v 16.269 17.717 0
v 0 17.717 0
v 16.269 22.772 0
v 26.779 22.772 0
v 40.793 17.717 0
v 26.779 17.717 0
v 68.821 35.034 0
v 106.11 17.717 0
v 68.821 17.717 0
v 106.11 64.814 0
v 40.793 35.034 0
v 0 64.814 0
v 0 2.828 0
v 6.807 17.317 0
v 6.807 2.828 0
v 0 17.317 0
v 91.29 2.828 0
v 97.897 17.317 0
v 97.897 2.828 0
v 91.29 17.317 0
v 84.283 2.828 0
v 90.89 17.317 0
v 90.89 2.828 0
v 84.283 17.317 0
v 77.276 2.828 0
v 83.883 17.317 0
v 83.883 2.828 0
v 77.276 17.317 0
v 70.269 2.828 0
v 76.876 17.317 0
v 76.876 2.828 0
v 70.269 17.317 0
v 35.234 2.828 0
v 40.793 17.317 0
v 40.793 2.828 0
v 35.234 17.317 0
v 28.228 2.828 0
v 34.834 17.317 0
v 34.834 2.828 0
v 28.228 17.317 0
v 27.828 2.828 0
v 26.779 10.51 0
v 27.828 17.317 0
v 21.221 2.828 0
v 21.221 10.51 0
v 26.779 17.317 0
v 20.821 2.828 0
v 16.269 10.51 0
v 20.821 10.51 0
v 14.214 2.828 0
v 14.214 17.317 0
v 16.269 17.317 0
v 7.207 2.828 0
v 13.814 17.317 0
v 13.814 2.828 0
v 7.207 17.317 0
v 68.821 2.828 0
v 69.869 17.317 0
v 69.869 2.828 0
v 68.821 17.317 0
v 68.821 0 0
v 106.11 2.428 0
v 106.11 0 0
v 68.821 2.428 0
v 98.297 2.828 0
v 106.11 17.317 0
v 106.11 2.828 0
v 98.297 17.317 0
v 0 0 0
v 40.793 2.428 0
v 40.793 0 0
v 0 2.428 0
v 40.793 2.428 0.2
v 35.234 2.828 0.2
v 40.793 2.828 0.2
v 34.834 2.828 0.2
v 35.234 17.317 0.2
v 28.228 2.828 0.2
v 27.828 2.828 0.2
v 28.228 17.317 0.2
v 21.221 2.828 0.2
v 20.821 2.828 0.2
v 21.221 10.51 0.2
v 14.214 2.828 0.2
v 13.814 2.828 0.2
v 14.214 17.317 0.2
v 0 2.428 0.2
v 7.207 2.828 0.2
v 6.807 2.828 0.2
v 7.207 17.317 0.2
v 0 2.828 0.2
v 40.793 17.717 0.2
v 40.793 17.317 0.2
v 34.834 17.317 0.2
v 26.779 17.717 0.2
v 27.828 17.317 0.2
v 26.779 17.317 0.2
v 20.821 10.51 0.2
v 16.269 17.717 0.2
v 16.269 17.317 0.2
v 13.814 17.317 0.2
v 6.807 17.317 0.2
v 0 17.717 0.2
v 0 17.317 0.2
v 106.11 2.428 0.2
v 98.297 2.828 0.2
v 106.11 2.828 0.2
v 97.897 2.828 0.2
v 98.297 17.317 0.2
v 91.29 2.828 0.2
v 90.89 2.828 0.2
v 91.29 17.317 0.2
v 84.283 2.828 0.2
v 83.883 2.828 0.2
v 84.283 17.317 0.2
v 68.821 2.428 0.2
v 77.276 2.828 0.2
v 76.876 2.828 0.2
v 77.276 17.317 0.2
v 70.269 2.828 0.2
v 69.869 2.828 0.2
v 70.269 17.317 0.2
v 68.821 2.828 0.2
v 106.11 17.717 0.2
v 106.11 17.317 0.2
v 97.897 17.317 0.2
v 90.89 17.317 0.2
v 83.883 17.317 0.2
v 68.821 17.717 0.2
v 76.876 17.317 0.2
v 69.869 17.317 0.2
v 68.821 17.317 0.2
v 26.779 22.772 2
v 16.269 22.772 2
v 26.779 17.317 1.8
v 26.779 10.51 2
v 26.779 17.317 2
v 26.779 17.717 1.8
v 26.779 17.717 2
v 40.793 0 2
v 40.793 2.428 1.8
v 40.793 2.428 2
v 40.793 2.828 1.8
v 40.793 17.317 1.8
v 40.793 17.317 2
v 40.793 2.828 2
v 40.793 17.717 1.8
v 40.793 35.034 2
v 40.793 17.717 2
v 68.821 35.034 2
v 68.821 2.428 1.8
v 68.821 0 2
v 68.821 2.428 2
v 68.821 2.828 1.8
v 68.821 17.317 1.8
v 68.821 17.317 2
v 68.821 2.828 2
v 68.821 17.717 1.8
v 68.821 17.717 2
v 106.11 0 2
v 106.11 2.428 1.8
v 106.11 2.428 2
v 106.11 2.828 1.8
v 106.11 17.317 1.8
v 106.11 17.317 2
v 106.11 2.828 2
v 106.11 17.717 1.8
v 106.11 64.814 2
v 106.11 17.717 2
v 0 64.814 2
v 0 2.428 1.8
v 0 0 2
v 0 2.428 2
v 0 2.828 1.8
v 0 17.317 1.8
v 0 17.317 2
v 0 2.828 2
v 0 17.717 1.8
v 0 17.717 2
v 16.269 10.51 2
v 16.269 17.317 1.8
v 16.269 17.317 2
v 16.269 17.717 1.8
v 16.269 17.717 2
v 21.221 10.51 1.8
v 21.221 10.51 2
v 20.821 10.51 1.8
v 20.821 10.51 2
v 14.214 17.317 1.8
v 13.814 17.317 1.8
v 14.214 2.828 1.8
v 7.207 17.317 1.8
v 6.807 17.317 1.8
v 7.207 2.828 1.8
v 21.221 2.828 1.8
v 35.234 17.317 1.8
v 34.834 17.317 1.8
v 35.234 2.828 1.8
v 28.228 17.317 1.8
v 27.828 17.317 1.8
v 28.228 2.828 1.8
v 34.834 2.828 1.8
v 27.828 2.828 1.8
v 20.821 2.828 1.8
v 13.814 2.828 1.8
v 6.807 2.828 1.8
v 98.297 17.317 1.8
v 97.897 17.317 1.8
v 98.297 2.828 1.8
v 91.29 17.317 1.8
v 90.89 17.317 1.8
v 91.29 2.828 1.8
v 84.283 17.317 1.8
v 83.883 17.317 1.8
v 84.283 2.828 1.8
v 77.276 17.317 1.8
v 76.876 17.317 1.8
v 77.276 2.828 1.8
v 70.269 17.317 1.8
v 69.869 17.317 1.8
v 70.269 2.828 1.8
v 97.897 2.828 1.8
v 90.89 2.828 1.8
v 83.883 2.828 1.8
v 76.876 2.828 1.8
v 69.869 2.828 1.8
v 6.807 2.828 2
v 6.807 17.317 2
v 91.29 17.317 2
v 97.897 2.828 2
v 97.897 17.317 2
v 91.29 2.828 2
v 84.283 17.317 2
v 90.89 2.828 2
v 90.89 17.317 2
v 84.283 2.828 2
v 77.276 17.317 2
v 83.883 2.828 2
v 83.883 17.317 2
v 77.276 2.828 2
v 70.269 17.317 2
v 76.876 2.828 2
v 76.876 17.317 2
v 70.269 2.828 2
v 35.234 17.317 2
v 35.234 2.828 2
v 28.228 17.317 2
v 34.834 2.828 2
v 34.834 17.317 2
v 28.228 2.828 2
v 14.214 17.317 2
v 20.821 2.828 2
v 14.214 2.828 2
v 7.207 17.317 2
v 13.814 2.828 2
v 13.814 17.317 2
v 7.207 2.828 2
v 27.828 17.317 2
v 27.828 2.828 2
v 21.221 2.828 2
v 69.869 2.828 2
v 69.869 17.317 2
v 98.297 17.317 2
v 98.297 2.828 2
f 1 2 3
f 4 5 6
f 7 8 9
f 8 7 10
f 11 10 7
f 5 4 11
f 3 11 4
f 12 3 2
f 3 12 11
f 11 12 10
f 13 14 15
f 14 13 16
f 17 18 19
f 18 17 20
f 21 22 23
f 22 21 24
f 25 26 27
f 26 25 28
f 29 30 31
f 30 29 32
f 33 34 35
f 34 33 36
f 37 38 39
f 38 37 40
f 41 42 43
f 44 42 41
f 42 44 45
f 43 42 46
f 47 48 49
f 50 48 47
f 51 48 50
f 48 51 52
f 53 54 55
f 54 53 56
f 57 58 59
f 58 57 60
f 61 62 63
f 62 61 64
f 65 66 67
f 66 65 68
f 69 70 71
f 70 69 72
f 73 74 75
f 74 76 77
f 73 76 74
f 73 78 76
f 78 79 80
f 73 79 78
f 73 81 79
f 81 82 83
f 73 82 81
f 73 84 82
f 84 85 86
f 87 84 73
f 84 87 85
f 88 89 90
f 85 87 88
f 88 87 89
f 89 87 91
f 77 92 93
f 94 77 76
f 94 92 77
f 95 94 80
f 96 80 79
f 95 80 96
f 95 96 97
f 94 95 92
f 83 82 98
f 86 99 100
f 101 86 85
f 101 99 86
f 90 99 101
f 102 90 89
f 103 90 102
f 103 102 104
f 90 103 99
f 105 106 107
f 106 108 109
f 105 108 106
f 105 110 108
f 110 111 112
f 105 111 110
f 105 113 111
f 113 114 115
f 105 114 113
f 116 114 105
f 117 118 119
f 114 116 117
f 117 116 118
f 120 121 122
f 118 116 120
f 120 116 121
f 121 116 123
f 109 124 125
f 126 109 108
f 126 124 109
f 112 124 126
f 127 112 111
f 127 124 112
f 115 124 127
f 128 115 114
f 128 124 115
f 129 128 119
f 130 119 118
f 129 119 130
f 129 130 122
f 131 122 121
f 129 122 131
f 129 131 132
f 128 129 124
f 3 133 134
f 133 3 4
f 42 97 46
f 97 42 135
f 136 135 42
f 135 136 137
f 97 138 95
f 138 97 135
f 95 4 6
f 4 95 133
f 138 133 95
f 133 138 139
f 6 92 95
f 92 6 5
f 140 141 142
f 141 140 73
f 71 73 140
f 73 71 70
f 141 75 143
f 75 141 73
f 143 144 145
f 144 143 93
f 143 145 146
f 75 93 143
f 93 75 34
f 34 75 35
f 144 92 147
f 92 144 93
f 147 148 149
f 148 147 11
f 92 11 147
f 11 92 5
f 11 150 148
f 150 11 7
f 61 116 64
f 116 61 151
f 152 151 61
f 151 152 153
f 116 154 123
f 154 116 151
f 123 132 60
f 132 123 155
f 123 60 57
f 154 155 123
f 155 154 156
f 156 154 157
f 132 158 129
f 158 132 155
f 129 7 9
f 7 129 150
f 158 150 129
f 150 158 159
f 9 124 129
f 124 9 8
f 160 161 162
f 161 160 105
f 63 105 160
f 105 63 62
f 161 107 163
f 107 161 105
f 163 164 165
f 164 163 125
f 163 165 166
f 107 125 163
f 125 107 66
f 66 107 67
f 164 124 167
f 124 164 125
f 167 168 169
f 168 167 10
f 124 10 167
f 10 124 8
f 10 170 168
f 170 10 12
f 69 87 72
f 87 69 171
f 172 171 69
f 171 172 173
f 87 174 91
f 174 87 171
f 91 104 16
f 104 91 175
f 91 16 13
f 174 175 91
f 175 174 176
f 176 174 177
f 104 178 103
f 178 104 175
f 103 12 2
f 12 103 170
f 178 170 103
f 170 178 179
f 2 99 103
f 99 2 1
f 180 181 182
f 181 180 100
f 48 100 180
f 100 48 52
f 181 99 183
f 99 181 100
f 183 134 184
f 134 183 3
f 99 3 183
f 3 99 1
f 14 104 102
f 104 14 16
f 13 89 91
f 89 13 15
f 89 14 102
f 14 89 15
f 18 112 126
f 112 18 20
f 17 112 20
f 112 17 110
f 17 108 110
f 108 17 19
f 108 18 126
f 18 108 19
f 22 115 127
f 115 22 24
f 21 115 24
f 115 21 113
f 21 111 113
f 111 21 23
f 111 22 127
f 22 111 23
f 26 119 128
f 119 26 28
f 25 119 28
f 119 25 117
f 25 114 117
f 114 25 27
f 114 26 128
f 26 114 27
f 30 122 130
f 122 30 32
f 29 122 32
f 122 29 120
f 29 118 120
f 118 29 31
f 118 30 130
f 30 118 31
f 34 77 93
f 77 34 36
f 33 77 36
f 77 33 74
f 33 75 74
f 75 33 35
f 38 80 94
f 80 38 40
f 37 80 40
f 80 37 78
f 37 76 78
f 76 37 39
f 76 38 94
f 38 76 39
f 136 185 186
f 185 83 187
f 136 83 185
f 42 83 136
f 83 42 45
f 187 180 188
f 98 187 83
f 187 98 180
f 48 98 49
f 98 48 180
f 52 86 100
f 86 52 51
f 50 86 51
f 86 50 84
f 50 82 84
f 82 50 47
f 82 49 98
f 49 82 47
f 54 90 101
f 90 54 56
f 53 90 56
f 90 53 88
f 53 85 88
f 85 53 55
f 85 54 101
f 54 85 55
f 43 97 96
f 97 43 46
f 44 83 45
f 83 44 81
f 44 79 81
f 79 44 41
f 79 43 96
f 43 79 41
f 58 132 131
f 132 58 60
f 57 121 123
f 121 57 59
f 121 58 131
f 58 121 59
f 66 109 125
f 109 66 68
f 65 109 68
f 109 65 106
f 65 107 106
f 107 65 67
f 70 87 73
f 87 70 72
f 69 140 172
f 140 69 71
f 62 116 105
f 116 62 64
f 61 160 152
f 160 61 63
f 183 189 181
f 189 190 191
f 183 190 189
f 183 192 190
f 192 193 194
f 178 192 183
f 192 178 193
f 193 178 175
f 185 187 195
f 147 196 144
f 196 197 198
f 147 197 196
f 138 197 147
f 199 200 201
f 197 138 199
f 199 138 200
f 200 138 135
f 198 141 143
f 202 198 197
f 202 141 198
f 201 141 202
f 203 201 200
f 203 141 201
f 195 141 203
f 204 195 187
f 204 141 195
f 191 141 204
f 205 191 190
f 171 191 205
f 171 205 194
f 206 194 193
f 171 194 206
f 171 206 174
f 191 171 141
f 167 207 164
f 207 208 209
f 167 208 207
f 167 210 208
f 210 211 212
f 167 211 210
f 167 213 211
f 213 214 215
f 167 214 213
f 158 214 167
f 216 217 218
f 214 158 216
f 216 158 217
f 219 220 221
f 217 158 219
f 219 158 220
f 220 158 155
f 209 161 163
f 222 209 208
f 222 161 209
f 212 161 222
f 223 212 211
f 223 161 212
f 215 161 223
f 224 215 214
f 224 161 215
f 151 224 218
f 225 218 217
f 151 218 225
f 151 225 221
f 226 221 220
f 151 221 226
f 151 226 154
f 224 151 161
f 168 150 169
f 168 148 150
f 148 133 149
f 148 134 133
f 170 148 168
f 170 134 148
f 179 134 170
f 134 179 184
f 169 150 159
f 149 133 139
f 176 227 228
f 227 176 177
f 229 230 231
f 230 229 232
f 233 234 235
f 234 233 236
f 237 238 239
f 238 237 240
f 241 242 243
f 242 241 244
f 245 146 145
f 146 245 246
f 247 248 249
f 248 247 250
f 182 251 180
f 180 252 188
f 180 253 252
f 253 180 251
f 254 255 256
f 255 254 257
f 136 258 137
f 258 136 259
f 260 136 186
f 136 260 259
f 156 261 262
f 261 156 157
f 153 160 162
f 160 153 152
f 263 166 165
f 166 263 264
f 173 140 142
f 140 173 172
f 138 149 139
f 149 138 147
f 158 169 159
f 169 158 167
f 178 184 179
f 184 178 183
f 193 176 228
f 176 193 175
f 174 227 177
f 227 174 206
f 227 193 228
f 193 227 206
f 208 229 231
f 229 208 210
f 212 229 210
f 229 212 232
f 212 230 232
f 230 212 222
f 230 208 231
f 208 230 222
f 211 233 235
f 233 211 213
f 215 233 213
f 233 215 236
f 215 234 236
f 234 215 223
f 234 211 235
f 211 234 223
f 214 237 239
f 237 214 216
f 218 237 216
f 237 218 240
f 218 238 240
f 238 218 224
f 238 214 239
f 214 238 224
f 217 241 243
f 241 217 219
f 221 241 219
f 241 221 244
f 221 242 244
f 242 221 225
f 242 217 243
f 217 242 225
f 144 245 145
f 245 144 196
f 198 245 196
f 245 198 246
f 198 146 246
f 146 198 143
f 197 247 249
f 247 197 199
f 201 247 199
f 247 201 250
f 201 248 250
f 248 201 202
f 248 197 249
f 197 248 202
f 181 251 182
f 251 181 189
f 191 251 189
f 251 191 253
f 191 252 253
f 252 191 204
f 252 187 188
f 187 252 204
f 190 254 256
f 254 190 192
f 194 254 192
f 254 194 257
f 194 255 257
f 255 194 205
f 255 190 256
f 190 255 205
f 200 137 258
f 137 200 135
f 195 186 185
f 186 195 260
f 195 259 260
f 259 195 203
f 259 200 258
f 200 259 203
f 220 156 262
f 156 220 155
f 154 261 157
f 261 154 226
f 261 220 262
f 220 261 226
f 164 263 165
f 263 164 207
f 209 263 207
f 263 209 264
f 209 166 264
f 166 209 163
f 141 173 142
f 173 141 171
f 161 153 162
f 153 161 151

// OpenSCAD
// file: ../janesville_common.scad
// =====================================================================
//  CMSP Janesville WI Station - shared settings and footprint
//  Frost & Granger, 1902 as-built prints.  HO scale 1:87 (adapted from the G scale 1:29 model).  Units: model mm.
//  Every other .scad file in this project does:  include <../janesville_common.scad>
// =====================================================================

// ---------- scale ----------
SCALE = 87;
BX = 2;        // brick, slate and tile texture is drawn this many times oversize so a 0.4 mm nozzle can print it
$sc = 0;      // furniture is drawn at the G-scale size and reduced: see g() in Furniture/interior.scad
function ft(f, i = 0) = (f * 12 + i) * 25.4 / ($sc == 0 ? SCALE : $sc);   // real feet + inches -> model mm

// ---------- printer ----------
// "P1S"  = Bambu Lab P1S, 256 x 256 x 256 bed  (use 252 usable)
// "GIGA" = Tom's large-format printer, 800 x 800 x 1000 (use 780 usable)
PRINTER = "P1S";
function bed_for(p) = p == "GIGA" ? [780, 780, 980] : [252, 252, 250];
BED = bed_for(PRINTER);

// ---------- colors (preview only; print color = filament) ----------
PULLMAN_GREEN = "#3B4A2C";   // windows, doors, trim
BRICK_RED     = "#8E3B2C";
MORTAR_WHITE  = "#F2EFE6";
STONE_BUFF    = "#C9B79C";

// ---------- joints between printed sections ----------
PIN_D      = 1.75;   // alignment pin (a stub of 1.75 mm filament)
PIN_CLEAR  = 0.2;   // hole oversize
PIN_DEPTH  = 4;      // hole depth each side of a cut
CUT_BAND   = 3;      // solid band each side of a cut so pins land in plastic

// ---------- NeoPixel wiring ----------
WIRE_CHANNEL = [6, 3.5];   // width x height of notches in under-floor ribs (3-wire bus)
FEED_HOLE_D  = 5;         // hole up through the floor into each room

// ---------- coordinates ----------
// x runs west -> east along the track.  x = 0 at the west end wall line.
// y = 0 at the main track-side wall line, +y toward town.
// Dimensions are to the MAIN WALL LINE (as the drawings are figured).

// Main building, B2077 / B2076.  Overall 128'-5".
X_WEST_END   = 0;
X_PAV_W      = ft(38, 9);                 // general waiting room wing  38'-9"
X_PAV_E      = X_PAV_W + ft(22, 6);       // center pavilion            22'-6"
X_SMOKE_E    = X_PAV_E + ft(36, 10);      // smoking room wing          36'-10"
X_MAIN_E     = X_SMOKE_E + ft(30, 4);     // lunch room wing            30'-4"  -> 128'-5"
MAIN_DEPTH   = ft(32, 0);                 // west wing, pavilion, smoking wing

// Lunch-room wing is narrower: 25'-4" deep (7'-2" + 11'-0" + 7'-2"),
// set back 1'-5" on the track side and 5'-3" on the town side.  VERIFY vs B2078/B2079.
LUNCH_Y0     = ft(1, 5);
LUNCH_Y1     = LUNCH_Y0 + ft(25, 4);

// Pavilion projections.  APPROXIMATE - verify against elevations.
PORCH_PROJ   = ft(3, 6);    // town side: two 6'-9" blocks project 3'-6"
PORCH_W      = ft(9, 0);    // recessed porch between them (open to y = MAIN_DEPTH)
BAY_PROJ     = ft(3, 0);    // track side: canted ticket-office bay
BAY_W_WALL   = ft(15, 6);   // bay width at the wall
BAY_W_FRONT  = ft(9, 6);    // bay width at its face
BAY_CX       = ft(46, 11);  // bay center from west end (B2077 track-side chain), not centered on the pavilion

// Baggage & express building, B2077: 47'-2" x 25'-4", 42'-0" east of the main building.
// Track wall assumed in line with the lunch wing.  VERIFY.
X_BAG_W      = X_MAIN_E + ft(42, 0);
X_BAG_E      = X_BAG_W + ft(47, 2);
BAG_Y0       = LUNCH_Y0;
BAG_Y1       = BAG_Y0 + ft(25, 4);

// Wall thicknesses (model mm)
T_MAIN  = 3.0;     // main block exterior walls (real 1'-5" = 5.0 mm, thinned)
T_LIGHT = 2.6;     // lunch wing, porch, bay, baggage building

// Heights (B2082 / B2078)
FLOOR_Z      = ft(1, 9);    // finished floor above finished grade
WALL_H       = ft(19, 0);   // floor to cornice, town side
SILL_H       = ft(2, 9);    // floor to top of window sill
BASE_PROJ    = ft(0, 4);    // stone base / water table projects past the wall line

// ---------- footprints (2D) ----------
module footprint_main() {
    union() {
        translate([X_WEST_END, 0]) square([X_SMOKE_E - X_WEST_END, MAIN_DEPTH]);
        translate([X_SMOKE_E, LUNCH_Y0]) square([X_MAIN_E - X_SMOKE_E, LUNCH_Y1 - LUNCH_Y0]);
        // town-side pavilion blocks with the recessed porch between them
        difference() {
            translate([X_PAV_W, MAIN_DEPTH - 0.01]) square([X_PAV_E - X_PAV_W, PORCH_PROJ]);
            translate([(X_PAV_W + X_PAV_E - PORCH_W) / 2, MAIN_DEPTH - 1]) square([PORCH_W, PORCH_PROJ + 2]);
        }
        // track-side canted bay
        let(cx = BAY_CX)
        polygon([[cx - BAY_W_WALL / 2, 0.01], [cx + BAY_W_WALL / 2, 0.01],
                 [cx + BAY_W_FRONT / 2, -BAY_PROJ], [cx - BAY_W_FRONT / 2, -BAY_PROJ]]);
    }
}

module footprint_baggage() {
    translate([X_BAG_W, BAG_Y0]) square([X_BAG_E - X_BAG_W, BAG_Y1 - BAG_Y0]);
}
// main file
// =====================================================================
//  Interior walls (partitions) from B2077 Plan of Main Floor, 1902
//  Printed flat. Both faces carry the varnished-oak wainscot noted on the plan:
//  baseboard line, cap rail at 5'-0", panel stiles every 2'-0"; plaster above.
//  Brick partitions run full height (18'-6"); stud partitions 10'-0" (ceilings come later).
//
//  interior_part(name, tile, bed)   interior_place(name)   interior_list()
//  interior_count(name, bed)        interior_splices(name, bed) / interior_splice_count(...)
// =====================================================================
include <../janesville_common.scad>

INT  = "W1_waiting_pavilion";   // when opened directly
TILE = -1;
VIEW = "flat";                  // "flat" or "placed"

T_BRICK = 2.0;      // brick partition (real 13")
T_STUD  = 1.6;      // stud partition (real 6")
WAIN_H  = 5.0;      // wainscot cap rail height, ft (B2082 lunch room section)
BASE_H  = 0.75;     // baseboard top, ft
STILE   = 2.0;      // panel stile spacing, ft
GROOVE  = 0.4;  GROOVE_D = 0.2;
SPLICE_W = 8; SPLICE_T = 0.6; SPLICE_CLEAR = 0.3;
HIGH = 18.5; LOW = 10;
$fn = 32;
L_MAIN_FT = 98 + 1/12;

// opening helpers: [center_ft along wall from start point, width_ft, bottom_ft, top_ft]
function O(c, w, b, t) = [c, w, b, t];
function DR(c, w = 2.83, t = 7.5) = [c, w, 0, t];

// lunch wing and baggage building interior faces (mm)
LW_Y0 = LUNCH_Y0 + T_LIGHT;  LW_Y1 = LUNCH_Y1 - T_LIGHT;
BG_Y0 = BAG_Y0 + T_LIGHT;    BG_Y1 = BAG_Y1 - T_LIGHT;
YT = T_MAIN; YN = MAIN_DEPTH - T_MAIN;        // main block inside faces, track / town

// [name, start [x,y] mm, end [x,y] mm, height_ft, thickness, openings]
// Openings are measured from the START point (ft).
INT_TABLE = [
  // general waiting room | pavilion  (x = 40'-3")
  ["W1_waiting_pavilion", [ft(40.25), YT], [ft(40.25), YN], HIGH, T_BRICK,
     [O(7 - T_MAIN / ft(1), 3, 3, 6.5),          // ticket window into the ticket office
      O(16.5 - T_MAIN / ft(1), 8, 0, 10)]],      // wide passage opening (I-beams over)
  // pavilion | smoking room  (x = 60'-3")
  ["W2_pavilion_smoking", [ft(60.25), YT], [ft(60.25), YN], HIGH, T_BRICK,
     [O(16.5 - T_MAIN / ft(1), 8, 0, 10)]],
  // smoking room | men's toilet + lunch-counter annex  (x = 87'-4": smoking room 26 ft inside)
  ["S1_smoking_east", [ft(87.35), YT], [ft(87.35), YN], HIGH, T_BRICK,
     [DR(7.5 - T_MAIN / ft(1), 5.67, 7.5),       // two 2'-10" doors to the lunch-counter annex
      DR(25 - T_MAIN / ft(1), 2.67)]],           // men's toilet door
  // ticket office + train order | passage  (y = 11'-9")
  ["P1_ticket_passage", [ft(40.25) + T_BRICK / 2, ft(11.75)], [ft(60.25) - T_BRICK / 2, ft(11.75)], LOW, T_STUD,
     [O(5, 4, 3, 6.5),                            // ticket counter window to the passage
      DR(16, 2.5)]],                              // door into the train-order office
  // ticket office | train order  (x = 55'-0")
  ["P2_ticket_trainorder", [ft(55), YT], [ft(55), ft(11.75) - T_STUD / 2], LOW, T_STUD,
     [DR(8, 2.5)]],
  // passage | women's toilet + vestibule  (y = 21'-3")
  ["P3_passage_town", [ft(40.25) + T_BRICK / 2, ft(21.25)], [ft(60.25) - T_BRICK / 2, ft(21.25)], LOW, T_STUD,
     [DR(4.5, 2.5),                               // women's toilet door
      O(13.5, 8, 0, 8.5)]],                       // open to the vestibule
  // women's toilet | vestibule  (x = 49'-6")
  ["P4_toilet_vestibule", [ft(49.5), ft(21.25) + T_STUD / 2], [ft(49.5), YN], LOW, T_STUD, []],
  // men's toilet | lunch-counter annex  (y = 16'-0")
  ["S2_menstoilet", [ft(96.3) + 0.3, ft(16)], [ft(L_MAIN_FT) - T_MAIN, ft(16)], LOW, T_STUD, []],     // short stub: the chimney base fills the rest of this line
  // kitchen | lunch room  (x = 116'-0")
  ["K1_kitchen", [ft(116), ft(13.5)], [ft(116), LW_Y1], 9.5, T_STUD,
     [DR(6.25, 2.67)]],
  // baggage room | express room
  ["B1_baggage_express", [X_BAG_W + ft(30.58), BG_Y0], [X_BAG_W + ft(30.58), BG_Y1], 10.5, T_BRICK,
     [DR(17.5, 3, 7.5)]]
];


function irow(n) = INT_TABLE[search([n], INT_TABLE)[0]];
function interior_list() = [for (r = INT_TABLE) r[0]];
function i_len(r) = norm(r[2] - r[1]);
function i_h(r)   = ft(r[3]);
function i_cuts(r, bed) = let(L = i_len(r), H = i_h(r), nx = ceil(L / (bed[0] - 2)), ny = ceil(H / (bed[1] - 2)))
    [nx, ny, [for (i = [1 : max(1, nx - 1)]) if (nx > 1) i * L / nx], [for (j = [1 : max(1, ny - 1)]) if (ny > 1) j * H / ny]];
function interior_count(n, bed) = let(c = i_cuts(irow(n), bed)) c[0] * c[1];
function interior_splice_count(n, bed) = len(i_cuts(irow(n), bed)[2]) * i_cuts(irow(n), bed)[1];
function i_splice_len(r) = min(i_h(r) - 8, ft(WAIN_H) - 3);

module i_openings2d(r) for (o = r[5]) {
    c = ft(o[0]); w = ft(o[1]); b = ft(o[2]); t = ft(o[3]);
    translate([c - w / 2, b - (b == 0 ? 1 : 0)]) square([w, t - b + (b == 0 ? 1 : 0)]);
}
module wainscot2d(L) {
    translate([-1, ft(WAIN_H) - GROOVE / 2]) square([L + 2, GROOVE]);       // cap rail
    translate([-1, ft(BASE_H) - GROOVE / 2]) square([L + 2, GROOVE]);       // baseboard
    for (u = [ft(STILE) : ft(STILE) : L - 2])
        translate([u - GROOVE / 2, ft(BASE_H)]) square([GROOVE, ft(WAIN_H - BASE_H)]);
}
function i_layers(r) = [0, GROOVE_D, SPLICE_T, r[4] - GROOVE_D, r[4]];

module i_region2d(r, k, bed) {
    L = i_len(r); H = i_h(r); cu = i_cuts(r, bed);
    difference() {
        square([L, H]);
        i_openings2d(r);
        if (k == 0 || k == 3) wainscot2d(L);
        if (k <= 1) for (c = cu[2]) translate([c - (SPLICE_W + SPLICE_CLEAR) / 2, 2])
            square([SPLICE_W + SPLICE_CLEAR, i_splice_len(r) + SPLICE_CLEAR]);
    }
}

module interior_part(n, tile = -1, bed = BED, only = -1) {
    r = irow(n); L = i_len(r); H = i_h(r); z = i_layers(r); cu = i_cuts(r, bed);
    nx = cu[0]; xc = cu[2]; yc = cu[3];
    ix = tile < 0 ? 0 : tile % nx; iy = tile < 0 ? 0 : floor(tile / nx);
    x0 = (tile < 0 || ix == 0) ? -2 : xc[ix - 1]; x1 = (tile < 0 || ix == nx - 1) ? L + 2 : xc[ix];
    y0 = (tile < 0 || iy == 0) ? -2 : yc[iy - 1]; y1 = (tile < 0 || iy == cu[1] - 1) ? H + 2 : yc[iy];
    for (k = [0 : 3]) if (only < 0 || only == k) translate([0, 0, z[k]]) linear_extrude(z[k + 1] - z[k])
        intersection() { i_region2d(r, k, bed); translate([x0, y0]) square([x1 - x0, y1 - y0]); }
}

module interior_splices(n, bed = BED) {
    r = irow(n); m = interior_splice_count(n, bed);
    if (m > 0) for (i = [0 : m - 1]) translate([i * (SPLICE_W + 3), 0, 0]) cube([SPLICE_W, i_splice_len(r), SPLICE_T - 0.1]);
}

module interior_place(n) {
    r = irow(n); d = r[2] - r[1]; a = atan2(d[1], d[0]); T = r[4];
    translate([r[1][0], r[1][1], FLOOR_Z]) rotate([0, 0, a]) rotate([90, 0, 0]) translate([0, 0, -T / 2]) interior_part(n);
}

LAYER = -1;   // cloud export helper
if (VIEW == "placed") for (n = interior_list()) interior_place(n);
else if (VIEW == "splices") interior_splices(INT, BED);
else interior_part(INT, TILE, BED, LAYER);
